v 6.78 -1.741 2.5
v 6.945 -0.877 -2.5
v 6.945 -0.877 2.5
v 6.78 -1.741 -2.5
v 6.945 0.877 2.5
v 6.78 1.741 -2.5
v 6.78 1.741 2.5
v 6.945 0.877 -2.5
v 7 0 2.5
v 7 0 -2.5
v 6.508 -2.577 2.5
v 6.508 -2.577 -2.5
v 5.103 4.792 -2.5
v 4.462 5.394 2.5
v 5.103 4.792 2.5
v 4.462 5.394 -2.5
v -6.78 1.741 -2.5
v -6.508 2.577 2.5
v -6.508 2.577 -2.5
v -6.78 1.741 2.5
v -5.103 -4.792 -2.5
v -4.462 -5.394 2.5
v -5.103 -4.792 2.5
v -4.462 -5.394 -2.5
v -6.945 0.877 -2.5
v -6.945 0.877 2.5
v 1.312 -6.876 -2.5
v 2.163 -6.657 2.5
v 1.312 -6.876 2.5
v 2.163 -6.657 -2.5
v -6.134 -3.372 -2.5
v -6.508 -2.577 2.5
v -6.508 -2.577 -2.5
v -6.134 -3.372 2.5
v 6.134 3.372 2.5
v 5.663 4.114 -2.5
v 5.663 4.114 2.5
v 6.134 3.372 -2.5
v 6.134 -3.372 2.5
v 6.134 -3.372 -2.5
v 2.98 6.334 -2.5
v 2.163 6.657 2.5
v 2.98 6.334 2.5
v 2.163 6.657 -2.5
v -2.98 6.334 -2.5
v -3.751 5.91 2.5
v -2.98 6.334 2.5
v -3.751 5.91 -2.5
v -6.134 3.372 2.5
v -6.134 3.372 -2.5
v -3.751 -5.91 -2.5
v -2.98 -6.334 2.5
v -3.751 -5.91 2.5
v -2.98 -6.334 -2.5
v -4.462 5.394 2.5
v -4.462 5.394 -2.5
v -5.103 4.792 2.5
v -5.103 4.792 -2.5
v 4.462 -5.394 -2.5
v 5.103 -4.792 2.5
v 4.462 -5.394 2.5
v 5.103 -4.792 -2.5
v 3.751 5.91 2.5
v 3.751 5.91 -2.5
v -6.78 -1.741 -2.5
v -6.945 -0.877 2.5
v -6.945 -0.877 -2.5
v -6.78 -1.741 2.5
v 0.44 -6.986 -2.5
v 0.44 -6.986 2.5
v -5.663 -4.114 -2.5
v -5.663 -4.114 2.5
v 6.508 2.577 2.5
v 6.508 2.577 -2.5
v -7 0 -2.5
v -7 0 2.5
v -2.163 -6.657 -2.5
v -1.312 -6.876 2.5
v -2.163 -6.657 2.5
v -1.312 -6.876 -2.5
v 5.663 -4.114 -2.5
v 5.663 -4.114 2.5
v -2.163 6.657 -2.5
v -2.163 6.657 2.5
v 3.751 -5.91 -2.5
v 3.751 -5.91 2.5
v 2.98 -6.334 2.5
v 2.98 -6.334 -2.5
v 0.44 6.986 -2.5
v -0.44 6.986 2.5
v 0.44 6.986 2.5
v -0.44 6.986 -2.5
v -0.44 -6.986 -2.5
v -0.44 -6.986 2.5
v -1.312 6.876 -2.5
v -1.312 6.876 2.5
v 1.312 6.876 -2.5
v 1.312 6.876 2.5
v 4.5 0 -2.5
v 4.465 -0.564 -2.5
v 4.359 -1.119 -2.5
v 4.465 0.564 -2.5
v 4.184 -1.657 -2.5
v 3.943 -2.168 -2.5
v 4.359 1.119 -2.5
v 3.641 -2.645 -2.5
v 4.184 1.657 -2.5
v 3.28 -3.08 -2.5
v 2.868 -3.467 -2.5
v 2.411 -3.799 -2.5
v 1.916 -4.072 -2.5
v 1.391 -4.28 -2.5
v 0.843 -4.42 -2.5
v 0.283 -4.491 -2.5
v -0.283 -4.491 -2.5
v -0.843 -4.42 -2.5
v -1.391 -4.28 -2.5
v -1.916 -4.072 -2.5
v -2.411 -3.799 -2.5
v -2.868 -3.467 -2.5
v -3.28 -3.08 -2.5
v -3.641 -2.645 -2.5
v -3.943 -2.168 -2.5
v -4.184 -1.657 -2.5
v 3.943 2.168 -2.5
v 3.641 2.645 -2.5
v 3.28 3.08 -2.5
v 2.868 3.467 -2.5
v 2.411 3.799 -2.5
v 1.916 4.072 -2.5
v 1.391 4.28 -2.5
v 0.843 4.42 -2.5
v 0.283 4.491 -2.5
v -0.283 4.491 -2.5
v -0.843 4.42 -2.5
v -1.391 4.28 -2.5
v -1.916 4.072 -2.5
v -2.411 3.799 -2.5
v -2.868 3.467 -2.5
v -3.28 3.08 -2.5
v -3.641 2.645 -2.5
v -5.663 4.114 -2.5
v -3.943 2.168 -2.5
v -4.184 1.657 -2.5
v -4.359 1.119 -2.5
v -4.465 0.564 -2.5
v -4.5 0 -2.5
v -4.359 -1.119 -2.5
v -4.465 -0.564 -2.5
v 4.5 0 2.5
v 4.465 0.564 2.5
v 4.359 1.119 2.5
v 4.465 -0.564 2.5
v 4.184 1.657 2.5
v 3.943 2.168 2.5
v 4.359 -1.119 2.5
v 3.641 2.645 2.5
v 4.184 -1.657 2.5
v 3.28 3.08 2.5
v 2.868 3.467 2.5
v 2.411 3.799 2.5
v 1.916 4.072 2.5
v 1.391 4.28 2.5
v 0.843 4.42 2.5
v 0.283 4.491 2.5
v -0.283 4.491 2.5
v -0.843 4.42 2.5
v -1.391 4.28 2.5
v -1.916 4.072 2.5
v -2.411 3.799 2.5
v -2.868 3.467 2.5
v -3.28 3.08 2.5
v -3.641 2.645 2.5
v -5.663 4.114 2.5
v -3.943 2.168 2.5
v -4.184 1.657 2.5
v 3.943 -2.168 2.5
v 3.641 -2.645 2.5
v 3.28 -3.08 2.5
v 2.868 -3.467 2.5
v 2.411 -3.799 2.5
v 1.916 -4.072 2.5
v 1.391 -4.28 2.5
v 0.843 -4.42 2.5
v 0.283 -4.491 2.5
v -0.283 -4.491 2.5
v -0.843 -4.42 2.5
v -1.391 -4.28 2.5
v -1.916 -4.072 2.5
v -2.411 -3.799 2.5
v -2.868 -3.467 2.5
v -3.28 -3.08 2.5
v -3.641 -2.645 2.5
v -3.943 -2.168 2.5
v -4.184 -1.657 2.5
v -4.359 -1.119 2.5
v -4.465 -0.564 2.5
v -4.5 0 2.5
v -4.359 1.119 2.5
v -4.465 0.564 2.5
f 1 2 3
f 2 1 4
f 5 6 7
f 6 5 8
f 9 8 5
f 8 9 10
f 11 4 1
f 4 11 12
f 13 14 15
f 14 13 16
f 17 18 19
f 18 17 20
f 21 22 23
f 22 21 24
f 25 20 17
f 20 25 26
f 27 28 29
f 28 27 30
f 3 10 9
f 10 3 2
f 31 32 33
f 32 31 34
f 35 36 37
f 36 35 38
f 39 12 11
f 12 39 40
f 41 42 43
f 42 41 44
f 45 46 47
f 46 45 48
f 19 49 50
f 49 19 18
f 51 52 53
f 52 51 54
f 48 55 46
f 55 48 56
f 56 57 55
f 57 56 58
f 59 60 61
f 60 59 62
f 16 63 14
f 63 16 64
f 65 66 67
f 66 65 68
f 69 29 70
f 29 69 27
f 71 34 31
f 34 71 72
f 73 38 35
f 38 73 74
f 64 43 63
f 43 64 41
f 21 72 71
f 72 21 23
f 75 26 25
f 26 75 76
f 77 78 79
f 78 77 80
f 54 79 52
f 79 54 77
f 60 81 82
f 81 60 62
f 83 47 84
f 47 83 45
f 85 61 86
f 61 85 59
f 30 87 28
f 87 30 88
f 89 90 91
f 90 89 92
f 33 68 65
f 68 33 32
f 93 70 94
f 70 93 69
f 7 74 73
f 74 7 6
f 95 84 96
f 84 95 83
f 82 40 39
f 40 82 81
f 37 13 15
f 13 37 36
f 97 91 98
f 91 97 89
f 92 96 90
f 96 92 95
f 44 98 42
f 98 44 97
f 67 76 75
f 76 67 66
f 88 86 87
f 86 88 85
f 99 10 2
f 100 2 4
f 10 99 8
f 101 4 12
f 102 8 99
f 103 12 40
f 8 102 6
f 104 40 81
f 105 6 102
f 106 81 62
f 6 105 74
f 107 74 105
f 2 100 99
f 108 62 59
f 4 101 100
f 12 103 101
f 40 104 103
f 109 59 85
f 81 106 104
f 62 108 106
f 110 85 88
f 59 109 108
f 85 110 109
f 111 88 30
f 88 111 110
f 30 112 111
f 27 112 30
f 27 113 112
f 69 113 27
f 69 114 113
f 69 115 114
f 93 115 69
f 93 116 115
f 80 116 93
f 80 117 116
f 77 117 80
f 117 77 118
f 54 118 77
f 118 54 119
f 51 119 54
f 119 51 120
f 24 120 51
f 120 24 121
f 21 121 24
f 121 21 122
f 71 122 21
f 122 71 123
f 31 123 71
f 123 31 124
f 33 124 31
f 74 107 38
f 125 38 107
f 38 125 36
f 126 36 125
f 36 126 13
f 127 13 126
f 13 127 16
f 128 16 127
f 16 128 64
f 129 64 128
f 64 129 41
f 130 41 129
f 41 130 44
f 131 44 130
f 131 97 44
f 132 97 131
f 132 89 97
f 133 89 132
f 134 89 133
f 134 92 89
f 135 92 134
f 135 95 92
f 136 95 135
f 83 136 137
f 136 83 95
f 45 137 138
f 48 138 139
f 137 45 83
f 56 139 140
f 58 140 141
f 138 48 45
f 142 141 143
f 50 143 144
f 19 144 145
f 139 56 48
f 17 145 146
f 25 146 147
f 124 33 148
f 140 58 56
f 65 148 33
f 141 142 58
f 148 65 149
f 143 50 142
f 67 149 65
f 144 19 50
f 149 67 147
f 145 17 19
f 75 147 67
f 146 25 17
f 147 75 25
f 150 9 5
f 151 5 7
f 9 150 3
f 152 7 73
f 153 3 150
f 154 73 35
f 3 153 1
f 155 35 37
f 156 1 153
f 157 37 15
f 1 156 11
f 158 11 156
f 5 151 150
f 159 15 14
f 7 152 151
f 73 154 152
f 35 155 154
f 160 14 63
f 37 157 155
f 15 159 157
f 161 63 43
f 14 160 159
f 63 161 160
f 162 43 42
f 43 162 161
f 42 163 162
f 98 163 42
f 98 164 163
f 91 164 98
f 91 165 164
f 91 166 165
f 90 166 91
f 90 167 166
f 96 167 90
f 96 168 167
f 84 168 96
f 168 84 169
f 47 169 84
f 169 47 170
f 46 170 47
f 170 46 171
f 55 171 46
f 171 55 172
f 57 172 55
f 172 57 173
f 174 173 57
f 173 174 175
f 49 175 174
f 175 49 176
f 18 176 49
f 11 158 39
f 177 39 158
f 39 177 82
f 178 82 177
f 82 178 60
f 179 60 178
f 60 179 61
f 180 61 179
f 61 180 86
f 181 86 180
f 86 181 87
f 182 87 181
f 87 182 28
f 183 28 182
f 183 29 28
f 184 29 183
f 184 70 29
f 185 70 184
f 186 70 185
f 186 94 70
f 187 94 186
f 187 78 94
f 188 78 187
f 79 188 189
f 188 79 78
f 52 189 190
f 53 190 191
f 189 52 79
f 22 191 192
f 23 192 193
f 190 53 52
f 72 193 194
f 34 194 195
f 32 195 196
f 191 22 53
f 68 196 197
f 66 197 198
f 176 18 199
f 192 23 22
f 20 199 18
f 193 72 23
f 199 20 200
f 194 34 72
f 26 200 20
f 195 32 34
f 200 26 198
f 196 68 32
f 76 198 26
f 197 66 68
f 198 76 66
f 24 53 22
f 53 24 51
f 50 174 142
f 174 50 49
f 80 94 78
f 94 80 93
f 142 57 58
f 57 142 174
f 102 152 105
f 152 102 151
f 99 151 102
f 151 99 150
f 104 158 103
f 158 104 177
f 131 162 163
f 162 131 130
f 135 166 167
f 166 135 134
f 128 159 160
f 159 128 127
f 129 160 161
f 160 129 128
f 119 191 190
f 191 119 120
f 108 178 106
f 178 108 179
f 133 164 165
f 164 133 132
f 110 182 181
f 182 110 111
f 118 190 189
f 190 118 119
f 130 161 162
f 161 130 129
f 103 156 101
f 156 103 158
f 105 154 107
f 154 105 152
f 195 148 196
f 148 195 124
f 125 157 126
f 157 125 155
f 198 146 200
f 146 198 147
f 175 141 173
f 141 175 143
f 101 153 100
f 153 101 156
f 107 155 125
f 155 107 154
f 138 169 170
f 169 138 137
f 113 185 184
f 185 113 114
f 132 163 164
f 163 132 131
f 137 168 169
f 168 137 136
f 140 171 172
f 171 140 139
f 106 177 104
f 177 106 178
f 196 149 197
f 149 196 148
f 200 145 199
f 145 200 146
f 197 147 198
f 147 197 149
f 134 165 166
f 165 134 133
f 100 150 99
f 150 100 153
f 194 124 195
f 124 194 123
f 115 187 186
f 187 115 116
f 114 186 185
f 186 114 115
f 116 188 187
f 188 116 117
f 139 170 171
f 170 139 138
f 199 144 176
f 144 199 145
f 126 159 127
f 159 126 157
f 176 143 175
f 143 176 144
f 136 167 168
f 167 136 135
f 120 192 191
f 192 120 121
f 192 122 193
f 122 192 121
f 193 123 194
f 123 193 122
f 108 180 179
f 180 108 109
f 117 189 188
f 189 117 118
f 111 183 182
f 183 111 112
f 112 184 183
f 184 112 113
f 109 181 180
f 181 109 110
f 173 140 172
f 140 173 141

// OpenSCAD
$fn = 50;


difference() {
	union() {
		translate(v = [0, 0, -2.5000000000]) {
			cylinder(h = 5, r = 7.0000000000);
		}
	}
	union() {
		translate(v = [0, 0, -100.0000000000]) {
			cylinder(h = 200, r = 4.5000000000);
		}
	}
}
